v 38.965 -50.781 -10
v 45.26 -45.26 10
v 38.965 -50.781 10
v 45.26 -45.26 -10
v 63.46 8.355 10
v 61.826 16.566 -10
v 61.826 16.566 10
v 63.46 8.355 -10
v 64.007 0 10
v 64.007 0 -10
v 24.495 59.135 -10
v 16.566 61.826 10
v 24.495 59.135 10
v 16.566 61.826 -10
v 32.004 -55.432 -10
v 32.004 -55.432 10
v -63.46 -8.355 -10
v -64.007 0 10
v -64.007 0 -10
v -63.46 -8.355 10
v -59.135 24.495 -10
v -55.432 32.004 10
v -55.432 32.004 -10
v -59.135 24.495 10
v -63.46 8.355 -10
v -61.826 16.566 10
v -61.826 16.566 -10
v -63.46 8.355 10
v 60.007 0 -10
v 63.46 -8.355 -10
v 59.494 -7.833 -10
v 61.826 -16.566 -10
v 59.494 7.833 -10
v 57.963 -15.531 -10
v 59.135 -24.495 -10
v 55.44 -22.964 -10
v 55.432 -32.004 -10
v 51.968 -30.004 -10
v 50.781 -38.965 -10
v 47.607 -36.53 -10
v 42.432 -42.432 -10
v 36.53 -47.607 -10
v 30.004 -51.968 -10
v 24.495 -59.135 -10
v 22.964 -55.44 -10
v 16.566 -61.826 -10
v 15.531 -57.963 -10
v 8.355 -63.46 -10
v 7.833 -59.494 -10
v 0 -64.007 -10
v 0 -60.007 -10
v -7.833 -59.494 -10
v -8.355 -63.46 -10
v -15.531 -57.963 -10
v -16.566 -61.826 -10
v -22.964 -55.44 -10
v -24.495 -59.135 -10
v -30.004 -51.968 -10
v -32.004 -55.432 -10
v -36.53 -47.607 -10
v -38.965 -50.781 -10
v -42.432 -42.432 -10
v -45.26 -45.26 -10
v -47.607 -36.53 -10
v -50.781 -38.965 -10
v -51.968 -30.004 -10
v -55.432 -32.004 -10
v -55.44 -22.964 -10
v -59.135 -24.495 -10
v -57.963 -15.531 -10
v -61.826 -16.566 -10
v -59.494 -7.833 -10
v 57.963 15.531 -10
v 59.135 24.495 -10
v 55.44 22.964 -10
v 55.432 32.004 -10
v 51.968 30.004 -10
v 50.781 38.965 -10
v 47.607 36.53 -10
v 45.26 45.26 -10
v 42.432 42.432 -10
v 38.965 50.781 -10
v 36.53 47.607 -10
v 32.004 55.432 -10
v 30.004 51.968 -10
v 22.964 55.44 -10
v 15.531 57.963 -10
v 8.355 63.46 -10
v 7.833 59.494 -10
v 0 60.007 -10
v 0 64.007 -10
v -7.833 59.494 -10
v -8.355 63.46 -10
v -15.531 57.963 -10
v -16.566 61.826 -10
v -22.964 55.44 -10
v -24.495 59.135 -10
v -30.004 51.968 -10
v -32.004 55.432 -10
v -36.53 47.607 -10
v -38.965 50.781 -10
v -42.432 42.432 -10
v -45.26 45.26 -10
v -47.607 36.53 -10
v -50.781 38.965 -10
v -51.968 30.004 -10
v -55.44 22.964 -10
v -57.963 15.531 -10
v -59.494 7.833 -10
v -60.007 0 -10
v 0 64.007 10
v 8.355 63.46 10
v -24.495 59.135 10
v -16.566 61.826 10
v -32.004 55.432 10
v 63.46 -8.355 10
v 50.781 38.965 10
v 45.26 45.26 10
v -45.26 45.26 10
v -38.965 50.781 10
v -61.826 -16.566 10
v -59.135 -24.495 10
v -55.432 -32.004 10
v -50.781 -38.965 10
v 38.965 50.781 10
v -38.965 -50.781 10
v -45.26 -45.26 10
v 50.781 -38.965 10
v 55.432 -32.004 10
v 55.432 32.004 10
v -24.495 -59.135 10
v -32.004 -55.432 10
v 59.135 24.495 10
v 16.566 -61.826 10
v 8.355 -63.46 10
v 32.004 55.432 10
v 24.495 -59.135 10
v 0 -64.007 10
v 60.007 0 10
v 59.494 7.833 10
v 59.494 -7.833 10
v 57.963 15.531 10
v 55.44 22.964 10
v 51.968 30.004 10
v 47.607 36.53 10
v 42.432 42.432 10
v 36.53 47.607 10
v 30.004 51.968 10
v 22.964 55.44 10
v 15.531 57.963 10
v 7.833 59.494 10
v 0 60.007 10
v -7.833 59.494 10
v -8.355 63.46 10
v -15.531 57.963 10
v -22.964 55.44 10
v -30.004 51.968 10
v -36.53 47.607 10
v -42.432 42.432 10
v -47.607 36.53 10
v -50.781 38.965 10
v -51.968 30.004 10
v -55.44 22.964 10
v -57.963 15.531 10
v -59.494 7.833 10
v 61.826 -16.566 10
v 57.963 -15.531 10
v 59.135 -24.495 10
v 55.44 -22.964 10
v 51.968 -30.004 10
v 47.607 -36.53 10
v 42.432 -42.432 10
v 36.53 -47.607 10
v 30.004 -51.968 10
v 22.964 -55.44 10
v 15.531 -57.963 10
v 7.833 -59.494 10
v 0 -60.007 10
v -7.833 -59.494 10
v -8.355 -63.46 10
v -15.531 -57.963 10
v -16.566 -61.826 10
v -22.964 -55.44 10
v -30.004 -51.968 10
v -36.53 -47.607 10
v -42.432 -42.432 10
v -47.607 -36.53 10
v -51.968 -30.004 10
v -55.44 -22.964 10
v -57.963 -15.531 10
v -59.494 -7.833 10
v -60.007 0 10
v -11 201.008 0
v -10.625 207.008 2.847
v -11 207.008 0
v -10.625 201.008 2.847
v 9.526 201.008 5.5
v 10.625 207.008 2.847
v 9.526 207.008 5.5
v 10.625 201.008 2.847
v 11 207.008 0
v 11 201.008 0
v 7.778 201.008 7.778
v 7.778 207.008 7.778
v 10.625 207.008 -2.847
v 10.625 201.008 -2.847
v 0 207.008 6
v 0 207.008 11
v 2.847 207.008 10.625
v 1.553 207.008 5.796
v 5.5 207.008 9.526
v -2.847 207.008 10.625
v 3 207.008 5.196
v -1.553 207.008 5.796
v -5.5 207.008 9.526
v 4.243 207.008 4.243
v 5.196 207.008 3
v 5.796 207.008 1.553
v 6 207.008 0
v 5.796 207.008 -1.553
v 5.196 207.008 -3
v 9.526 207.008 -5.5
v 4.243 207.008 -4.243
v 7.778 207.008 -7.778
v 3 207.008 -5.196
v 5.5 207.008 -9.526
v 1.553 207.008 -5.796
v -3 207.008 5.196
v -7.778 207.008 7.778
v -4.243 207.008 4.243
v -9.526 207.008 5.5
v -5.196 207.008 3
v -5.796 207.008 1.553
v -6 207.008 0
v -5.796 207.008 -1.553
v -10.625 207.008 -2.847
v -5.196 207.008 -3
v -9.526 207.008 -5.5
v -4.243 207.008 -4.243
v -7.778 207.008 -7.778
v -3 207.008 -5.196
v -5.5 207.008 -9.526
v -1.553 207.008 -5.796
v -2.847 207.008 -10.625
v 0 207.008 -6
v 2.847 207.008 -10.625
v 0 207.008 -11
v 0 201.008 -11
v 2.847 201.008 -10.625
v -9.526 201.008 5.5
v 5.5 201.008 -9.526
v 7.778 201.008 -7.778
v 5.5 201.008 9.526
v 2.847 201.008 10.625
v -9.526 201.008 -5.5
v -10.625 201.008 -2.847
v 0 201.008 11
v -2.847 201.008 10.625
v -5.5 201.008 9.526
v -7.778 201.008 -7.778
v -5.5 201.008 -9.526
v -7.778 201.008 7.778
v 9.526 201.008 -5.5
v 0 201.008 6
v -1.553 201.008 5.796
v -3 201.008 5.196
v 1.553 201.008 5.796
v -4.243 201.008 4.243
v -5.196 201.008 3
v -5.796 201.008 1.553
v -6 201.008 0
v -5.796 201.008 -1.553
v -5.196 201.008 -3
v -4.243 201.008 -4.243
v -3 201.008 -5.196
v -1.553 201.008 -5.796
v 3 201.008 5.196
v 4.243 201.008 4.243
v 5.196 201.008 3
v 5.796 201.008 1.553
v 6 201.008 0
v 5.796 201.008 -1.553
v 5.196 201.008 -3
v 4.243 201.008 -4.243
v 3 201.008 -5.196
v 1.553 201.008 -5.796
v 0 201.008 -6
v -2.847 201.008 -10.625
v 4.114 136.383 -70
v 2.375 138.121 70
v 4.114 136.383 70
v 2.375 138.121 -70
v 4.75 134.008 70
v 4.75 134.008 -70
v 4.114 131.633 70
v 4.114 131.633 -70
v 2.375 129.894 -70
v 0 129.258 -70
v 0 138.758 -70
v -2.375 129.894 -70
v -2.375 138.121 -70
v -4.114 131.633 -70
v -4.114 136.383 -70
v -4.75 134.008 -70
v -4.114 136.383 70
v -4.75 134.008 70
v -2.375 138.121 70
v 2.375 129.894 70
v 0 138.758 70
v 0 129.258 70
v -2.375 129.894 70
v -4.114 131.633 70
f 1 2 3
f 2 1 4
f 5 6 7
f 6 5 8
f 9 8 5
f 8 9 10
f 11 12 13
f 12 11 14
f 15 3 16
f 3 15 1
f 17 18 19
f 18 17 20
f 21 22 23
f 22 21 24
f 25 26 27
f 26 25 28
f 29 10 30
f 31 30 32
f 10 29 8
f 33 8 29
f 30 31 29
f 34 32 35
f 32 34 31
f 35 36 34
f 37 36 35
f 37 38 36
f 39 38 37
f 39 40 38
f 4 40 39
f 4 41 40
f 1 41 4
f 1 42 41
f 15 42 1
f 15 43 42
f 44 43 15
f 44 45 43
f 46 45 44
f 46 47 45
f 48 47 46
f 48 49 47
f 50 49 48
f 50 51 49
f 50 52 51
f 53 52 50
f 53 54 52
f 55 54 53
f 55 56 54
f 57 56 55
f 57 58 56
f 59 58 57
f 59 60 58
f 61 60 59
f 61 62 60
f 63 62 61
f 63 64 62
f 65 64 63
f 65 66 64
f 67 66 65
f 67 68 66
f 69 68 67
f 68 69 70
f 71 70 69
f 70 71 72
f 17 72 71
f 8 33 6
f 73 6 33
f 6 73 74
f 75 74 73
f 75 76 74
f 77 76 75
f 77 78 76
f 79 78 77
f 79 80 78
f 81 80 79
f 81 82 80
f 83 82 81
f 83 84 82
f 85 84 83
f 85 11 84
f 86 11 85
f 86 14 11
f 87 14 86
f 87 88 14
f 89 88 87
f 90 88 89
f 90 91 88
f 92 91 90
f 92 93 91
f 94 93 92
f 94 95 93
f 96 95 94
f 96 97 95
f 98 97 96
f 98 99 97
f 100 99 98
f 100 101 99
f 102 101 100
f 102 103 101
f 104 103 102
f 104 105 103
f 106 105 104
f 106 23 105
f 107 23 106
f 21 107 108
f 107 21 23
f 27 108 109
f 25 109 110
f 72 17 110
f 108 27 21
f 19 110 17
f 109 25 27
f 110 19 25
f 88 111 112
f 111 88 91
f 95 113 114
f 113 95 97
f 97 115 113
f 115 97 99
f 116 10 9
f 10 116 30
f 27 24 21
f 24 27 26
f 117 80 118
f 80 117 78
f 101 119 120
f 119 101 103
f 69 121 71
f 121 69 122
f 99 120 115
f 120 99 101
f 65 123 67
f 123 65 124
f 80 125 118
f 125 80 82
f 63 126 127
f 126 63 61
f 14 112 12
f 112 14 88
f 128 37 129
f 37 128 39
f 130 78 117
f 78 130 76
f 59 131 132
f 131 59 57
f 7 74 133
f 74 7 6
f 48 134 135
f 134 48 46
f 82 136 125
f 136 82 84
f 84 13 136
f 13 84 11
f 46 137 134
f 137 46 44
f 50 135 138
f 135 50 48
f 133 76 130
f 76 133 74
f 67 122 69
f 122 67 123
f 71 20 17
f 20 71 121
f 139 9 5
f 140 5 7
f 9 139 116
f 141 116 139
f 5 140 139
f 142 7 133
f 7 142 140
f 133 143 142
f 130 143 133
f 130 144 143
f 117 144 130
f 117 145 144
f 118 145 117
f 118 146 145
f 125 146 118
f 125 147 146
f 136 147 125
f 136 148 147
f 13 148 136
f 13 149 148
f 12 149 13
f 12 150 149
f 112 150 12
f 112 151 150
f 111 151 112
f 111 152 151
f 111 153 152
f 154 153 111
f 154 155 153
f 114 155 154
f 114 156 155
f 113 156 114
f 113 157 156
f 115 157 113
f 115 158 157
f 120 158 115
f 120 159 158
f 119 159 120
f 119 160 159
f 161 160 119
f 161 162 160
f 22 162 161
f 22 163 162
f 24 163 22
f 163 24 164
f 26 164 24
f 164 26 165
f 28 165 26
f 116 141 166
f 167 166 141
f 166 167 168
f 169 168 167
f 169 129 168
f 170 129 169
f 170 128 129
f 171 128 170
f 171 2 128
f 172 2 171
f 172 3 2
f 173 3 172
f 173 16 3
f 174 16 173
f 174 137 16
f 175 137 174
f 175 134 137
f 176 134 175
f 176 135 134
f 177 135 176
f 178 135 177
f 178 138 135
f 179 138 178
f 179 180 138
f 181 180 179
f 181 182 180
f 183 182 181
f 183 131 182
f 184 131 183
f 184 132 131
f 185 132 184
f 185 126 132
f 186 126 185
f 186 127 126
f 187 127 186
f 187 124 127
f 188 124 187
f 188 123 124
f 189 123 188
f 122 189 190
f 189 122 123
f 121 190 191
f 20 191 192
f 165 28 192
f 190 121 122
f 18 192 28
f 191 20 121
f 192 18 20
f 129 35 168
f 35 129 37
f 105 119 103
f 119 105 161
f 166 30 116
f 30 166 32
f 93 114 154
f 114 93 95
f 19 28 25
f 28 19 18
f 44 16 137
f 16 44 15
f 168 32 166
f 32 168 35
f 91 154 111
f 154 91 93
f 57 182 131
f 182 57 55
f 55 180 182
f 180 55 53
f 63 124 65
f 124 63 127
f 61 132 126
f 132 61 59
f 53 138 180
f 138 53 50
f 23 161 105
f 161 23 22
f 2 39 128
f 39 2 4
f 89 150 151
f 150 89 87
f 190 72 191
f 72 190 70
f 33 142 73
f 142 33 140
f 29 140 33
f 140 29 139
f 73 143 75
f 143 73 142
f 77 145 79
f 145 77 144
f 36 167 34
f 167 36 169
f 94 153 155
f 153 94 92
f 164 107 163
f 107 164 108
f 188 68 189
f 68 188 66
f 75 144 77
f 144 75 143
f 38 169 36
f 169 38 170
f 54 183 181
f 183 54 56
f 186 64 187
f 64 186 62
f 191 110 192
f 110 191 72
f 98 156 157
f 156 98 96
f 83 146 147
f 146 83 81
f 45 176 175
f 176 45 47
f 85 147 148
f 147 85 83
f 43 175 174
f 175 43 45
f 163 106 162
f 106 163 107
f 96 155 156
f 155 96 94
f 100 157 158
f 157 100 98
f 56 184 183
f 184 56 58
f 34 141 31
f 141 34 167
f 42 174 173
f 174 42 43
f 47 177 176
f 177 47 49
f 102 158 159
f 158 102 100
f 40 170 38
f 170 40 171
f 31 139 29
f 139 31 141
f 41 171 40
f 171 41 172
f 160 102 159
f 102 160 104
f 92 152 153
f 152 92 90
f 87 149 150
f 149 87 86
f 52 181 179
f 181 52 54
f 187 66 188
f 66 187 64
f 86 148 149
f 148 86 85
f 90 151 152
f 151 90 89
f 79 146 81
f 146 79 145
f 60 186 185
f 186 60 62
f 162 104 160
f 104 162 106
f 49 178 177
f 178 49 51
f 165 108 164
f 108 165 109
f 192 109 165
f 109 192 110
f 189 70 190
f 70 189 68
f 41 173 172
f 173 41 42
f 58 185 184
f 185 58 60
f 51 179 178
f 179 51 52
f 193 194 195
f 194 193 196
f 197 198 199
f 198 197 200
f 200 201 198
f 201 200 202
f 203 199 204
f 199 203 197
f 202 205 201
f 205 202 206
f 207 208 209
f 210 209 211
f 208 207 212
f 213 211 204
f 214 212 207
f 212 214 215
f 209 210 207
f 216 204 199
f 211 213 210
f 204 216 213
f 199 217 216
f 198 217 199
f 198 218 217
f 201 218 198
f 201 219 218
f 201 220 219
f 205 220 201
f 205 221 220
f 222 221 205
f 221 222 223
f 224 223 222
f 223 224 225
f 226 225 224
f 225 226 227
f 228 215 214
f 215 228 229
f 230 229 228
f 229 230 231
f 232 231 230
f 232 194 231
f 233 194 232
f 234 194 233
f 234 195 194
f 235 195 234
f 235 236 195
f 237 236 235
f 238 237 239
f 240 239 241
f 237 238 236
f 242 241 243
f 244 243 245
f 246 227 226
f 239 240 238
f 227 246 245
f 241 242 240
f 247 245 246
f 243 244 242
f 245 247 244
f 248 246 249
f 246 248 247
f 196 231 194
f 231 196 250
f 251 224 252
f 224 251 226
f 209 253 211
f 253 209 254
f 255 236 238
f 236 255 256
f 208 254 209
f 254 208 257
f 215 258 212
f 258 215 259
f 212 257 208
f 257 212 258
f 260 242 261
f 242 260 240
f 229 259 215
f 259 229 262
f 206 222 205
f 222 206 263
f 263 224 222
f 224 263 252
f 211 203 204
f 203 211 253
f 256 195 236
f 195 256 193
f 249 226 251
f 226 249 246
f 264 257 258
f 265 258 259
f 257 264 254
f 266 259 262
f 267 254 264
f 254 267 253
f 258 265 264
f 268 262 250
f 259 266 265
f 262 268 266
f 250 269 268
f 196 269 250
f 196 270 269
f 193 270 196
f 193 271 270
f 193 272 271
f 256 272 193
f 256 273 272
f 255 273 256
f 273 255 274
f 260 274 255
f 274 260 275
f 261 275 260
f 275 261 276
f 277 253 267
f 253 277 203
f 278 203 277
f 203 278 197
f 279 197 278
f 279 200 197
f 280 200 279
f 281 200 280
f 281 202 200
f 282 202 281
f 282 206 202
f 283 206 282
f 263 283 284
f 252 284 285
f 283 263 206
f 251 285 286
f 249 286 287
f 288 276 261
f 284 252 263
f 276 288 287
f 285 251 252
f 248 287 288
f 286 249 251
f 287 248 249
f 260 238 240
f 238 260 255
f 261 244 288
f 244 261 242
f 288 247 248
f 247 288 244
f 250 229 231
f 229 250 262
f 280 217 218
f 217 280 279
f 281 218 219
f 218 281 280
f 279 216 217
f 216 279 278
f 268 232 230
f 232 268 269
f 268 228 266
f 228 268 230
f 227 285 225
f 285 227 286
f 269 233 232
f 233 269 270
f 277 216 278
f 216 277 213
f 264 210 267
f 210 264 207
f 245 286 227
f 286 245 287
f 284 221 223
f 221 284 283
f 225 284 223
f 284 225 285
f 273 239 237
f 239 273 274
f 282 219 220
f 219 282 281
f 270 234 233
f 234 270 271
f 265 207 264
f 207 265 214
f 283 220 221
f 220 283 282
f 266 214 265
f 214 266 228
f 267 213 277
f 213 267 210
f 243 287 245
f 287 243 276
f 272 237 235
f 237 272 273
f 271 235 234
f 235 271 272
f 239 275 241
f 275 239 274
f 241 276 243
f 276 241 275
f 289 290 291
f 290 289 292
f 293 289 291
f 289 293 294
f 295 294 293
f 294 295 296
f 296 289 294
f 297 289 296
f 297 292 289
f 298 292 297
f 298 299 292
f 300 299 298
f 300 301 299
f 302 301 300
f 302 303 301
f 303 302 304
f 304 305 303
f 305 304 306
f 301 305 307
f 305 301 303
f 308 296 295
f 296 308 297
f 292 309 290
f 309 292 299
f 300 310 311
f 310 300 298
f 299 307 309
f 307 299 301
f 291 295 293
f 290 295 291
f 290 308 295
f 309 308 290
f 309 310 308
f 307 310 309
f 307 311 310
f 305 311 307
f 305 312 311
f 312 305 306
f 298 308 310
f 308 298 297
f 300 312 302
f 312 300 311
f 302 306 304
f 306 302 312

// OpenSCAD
// Auto-generated by scripts/author_from_manifest.py (Phase D.3).
// Source: data/phase_d_manifest.json (sku_intent='tolco-fig1-clevis-hanger-4in').
// Do not hand-edit — regenerate from the manifest.
//
// @part tolco_fig1_clevis_hanger_4in
// @kind hanger
// @category hanger.clevis
// @display-name "Tolco FIG 1 Clevis Hanger 4\""
// @mfg nvent_tolco
// @mfg-pn FIG_1_4in
// @listing UL
// @price-usd 8.25
// @install-minutes 4
// @crew journeyman
// @param size_in number default=4 label="Size" unit="in"
// @port pipe position=[0,0,0] direction=[0,1,0] style=grooved size_in=4 role=run_a

size_in = 4.0;

function od_mm(nps) =
    nps ==   1  ? 33.4 :
    nps == 1.25 ? 42.2 :
    nps == 1.5  ? 48.3 :
    nps ==   2  ? 60.3 :
    nps == 2.5  ? 73.0 :
    nps ==   3  ? 88.9 :
    nps ==   4  ? 114.3 :
    nps ==   6  ? 168.3 :
    nps ==   8  ? 219.1 : 60.3;

od = od_mm(size_in);
ring_id = od * 1.05;
ring_od = ring_id + 8;
strap_w = 20;
rod_len = 140;

union() {
    // Ring
    difference() {
        cylinder(h = strap_w, d = ring_od, center = true, $fn = 48);
        cylinder(h = strap_w + 1, d = ring_id, center = true, $fn = 48);
    }
    // Rod up +Y
    translate([0, rod_len/2 + ring_od/2, 0])
        cylinder(h = rod_len, d = 9.5, center = true, $fn = 12);
    // Top swivel eye
    translate([0, rod_len + ring_od/2, 0])
        rotate([90, 0, 0])
        difference() {
            cylinder(h = 6, d = 22, center = true, $fn = 24);
            cylinder(h = 8, d = 12, center = true, $fn = 24);
        }
}
